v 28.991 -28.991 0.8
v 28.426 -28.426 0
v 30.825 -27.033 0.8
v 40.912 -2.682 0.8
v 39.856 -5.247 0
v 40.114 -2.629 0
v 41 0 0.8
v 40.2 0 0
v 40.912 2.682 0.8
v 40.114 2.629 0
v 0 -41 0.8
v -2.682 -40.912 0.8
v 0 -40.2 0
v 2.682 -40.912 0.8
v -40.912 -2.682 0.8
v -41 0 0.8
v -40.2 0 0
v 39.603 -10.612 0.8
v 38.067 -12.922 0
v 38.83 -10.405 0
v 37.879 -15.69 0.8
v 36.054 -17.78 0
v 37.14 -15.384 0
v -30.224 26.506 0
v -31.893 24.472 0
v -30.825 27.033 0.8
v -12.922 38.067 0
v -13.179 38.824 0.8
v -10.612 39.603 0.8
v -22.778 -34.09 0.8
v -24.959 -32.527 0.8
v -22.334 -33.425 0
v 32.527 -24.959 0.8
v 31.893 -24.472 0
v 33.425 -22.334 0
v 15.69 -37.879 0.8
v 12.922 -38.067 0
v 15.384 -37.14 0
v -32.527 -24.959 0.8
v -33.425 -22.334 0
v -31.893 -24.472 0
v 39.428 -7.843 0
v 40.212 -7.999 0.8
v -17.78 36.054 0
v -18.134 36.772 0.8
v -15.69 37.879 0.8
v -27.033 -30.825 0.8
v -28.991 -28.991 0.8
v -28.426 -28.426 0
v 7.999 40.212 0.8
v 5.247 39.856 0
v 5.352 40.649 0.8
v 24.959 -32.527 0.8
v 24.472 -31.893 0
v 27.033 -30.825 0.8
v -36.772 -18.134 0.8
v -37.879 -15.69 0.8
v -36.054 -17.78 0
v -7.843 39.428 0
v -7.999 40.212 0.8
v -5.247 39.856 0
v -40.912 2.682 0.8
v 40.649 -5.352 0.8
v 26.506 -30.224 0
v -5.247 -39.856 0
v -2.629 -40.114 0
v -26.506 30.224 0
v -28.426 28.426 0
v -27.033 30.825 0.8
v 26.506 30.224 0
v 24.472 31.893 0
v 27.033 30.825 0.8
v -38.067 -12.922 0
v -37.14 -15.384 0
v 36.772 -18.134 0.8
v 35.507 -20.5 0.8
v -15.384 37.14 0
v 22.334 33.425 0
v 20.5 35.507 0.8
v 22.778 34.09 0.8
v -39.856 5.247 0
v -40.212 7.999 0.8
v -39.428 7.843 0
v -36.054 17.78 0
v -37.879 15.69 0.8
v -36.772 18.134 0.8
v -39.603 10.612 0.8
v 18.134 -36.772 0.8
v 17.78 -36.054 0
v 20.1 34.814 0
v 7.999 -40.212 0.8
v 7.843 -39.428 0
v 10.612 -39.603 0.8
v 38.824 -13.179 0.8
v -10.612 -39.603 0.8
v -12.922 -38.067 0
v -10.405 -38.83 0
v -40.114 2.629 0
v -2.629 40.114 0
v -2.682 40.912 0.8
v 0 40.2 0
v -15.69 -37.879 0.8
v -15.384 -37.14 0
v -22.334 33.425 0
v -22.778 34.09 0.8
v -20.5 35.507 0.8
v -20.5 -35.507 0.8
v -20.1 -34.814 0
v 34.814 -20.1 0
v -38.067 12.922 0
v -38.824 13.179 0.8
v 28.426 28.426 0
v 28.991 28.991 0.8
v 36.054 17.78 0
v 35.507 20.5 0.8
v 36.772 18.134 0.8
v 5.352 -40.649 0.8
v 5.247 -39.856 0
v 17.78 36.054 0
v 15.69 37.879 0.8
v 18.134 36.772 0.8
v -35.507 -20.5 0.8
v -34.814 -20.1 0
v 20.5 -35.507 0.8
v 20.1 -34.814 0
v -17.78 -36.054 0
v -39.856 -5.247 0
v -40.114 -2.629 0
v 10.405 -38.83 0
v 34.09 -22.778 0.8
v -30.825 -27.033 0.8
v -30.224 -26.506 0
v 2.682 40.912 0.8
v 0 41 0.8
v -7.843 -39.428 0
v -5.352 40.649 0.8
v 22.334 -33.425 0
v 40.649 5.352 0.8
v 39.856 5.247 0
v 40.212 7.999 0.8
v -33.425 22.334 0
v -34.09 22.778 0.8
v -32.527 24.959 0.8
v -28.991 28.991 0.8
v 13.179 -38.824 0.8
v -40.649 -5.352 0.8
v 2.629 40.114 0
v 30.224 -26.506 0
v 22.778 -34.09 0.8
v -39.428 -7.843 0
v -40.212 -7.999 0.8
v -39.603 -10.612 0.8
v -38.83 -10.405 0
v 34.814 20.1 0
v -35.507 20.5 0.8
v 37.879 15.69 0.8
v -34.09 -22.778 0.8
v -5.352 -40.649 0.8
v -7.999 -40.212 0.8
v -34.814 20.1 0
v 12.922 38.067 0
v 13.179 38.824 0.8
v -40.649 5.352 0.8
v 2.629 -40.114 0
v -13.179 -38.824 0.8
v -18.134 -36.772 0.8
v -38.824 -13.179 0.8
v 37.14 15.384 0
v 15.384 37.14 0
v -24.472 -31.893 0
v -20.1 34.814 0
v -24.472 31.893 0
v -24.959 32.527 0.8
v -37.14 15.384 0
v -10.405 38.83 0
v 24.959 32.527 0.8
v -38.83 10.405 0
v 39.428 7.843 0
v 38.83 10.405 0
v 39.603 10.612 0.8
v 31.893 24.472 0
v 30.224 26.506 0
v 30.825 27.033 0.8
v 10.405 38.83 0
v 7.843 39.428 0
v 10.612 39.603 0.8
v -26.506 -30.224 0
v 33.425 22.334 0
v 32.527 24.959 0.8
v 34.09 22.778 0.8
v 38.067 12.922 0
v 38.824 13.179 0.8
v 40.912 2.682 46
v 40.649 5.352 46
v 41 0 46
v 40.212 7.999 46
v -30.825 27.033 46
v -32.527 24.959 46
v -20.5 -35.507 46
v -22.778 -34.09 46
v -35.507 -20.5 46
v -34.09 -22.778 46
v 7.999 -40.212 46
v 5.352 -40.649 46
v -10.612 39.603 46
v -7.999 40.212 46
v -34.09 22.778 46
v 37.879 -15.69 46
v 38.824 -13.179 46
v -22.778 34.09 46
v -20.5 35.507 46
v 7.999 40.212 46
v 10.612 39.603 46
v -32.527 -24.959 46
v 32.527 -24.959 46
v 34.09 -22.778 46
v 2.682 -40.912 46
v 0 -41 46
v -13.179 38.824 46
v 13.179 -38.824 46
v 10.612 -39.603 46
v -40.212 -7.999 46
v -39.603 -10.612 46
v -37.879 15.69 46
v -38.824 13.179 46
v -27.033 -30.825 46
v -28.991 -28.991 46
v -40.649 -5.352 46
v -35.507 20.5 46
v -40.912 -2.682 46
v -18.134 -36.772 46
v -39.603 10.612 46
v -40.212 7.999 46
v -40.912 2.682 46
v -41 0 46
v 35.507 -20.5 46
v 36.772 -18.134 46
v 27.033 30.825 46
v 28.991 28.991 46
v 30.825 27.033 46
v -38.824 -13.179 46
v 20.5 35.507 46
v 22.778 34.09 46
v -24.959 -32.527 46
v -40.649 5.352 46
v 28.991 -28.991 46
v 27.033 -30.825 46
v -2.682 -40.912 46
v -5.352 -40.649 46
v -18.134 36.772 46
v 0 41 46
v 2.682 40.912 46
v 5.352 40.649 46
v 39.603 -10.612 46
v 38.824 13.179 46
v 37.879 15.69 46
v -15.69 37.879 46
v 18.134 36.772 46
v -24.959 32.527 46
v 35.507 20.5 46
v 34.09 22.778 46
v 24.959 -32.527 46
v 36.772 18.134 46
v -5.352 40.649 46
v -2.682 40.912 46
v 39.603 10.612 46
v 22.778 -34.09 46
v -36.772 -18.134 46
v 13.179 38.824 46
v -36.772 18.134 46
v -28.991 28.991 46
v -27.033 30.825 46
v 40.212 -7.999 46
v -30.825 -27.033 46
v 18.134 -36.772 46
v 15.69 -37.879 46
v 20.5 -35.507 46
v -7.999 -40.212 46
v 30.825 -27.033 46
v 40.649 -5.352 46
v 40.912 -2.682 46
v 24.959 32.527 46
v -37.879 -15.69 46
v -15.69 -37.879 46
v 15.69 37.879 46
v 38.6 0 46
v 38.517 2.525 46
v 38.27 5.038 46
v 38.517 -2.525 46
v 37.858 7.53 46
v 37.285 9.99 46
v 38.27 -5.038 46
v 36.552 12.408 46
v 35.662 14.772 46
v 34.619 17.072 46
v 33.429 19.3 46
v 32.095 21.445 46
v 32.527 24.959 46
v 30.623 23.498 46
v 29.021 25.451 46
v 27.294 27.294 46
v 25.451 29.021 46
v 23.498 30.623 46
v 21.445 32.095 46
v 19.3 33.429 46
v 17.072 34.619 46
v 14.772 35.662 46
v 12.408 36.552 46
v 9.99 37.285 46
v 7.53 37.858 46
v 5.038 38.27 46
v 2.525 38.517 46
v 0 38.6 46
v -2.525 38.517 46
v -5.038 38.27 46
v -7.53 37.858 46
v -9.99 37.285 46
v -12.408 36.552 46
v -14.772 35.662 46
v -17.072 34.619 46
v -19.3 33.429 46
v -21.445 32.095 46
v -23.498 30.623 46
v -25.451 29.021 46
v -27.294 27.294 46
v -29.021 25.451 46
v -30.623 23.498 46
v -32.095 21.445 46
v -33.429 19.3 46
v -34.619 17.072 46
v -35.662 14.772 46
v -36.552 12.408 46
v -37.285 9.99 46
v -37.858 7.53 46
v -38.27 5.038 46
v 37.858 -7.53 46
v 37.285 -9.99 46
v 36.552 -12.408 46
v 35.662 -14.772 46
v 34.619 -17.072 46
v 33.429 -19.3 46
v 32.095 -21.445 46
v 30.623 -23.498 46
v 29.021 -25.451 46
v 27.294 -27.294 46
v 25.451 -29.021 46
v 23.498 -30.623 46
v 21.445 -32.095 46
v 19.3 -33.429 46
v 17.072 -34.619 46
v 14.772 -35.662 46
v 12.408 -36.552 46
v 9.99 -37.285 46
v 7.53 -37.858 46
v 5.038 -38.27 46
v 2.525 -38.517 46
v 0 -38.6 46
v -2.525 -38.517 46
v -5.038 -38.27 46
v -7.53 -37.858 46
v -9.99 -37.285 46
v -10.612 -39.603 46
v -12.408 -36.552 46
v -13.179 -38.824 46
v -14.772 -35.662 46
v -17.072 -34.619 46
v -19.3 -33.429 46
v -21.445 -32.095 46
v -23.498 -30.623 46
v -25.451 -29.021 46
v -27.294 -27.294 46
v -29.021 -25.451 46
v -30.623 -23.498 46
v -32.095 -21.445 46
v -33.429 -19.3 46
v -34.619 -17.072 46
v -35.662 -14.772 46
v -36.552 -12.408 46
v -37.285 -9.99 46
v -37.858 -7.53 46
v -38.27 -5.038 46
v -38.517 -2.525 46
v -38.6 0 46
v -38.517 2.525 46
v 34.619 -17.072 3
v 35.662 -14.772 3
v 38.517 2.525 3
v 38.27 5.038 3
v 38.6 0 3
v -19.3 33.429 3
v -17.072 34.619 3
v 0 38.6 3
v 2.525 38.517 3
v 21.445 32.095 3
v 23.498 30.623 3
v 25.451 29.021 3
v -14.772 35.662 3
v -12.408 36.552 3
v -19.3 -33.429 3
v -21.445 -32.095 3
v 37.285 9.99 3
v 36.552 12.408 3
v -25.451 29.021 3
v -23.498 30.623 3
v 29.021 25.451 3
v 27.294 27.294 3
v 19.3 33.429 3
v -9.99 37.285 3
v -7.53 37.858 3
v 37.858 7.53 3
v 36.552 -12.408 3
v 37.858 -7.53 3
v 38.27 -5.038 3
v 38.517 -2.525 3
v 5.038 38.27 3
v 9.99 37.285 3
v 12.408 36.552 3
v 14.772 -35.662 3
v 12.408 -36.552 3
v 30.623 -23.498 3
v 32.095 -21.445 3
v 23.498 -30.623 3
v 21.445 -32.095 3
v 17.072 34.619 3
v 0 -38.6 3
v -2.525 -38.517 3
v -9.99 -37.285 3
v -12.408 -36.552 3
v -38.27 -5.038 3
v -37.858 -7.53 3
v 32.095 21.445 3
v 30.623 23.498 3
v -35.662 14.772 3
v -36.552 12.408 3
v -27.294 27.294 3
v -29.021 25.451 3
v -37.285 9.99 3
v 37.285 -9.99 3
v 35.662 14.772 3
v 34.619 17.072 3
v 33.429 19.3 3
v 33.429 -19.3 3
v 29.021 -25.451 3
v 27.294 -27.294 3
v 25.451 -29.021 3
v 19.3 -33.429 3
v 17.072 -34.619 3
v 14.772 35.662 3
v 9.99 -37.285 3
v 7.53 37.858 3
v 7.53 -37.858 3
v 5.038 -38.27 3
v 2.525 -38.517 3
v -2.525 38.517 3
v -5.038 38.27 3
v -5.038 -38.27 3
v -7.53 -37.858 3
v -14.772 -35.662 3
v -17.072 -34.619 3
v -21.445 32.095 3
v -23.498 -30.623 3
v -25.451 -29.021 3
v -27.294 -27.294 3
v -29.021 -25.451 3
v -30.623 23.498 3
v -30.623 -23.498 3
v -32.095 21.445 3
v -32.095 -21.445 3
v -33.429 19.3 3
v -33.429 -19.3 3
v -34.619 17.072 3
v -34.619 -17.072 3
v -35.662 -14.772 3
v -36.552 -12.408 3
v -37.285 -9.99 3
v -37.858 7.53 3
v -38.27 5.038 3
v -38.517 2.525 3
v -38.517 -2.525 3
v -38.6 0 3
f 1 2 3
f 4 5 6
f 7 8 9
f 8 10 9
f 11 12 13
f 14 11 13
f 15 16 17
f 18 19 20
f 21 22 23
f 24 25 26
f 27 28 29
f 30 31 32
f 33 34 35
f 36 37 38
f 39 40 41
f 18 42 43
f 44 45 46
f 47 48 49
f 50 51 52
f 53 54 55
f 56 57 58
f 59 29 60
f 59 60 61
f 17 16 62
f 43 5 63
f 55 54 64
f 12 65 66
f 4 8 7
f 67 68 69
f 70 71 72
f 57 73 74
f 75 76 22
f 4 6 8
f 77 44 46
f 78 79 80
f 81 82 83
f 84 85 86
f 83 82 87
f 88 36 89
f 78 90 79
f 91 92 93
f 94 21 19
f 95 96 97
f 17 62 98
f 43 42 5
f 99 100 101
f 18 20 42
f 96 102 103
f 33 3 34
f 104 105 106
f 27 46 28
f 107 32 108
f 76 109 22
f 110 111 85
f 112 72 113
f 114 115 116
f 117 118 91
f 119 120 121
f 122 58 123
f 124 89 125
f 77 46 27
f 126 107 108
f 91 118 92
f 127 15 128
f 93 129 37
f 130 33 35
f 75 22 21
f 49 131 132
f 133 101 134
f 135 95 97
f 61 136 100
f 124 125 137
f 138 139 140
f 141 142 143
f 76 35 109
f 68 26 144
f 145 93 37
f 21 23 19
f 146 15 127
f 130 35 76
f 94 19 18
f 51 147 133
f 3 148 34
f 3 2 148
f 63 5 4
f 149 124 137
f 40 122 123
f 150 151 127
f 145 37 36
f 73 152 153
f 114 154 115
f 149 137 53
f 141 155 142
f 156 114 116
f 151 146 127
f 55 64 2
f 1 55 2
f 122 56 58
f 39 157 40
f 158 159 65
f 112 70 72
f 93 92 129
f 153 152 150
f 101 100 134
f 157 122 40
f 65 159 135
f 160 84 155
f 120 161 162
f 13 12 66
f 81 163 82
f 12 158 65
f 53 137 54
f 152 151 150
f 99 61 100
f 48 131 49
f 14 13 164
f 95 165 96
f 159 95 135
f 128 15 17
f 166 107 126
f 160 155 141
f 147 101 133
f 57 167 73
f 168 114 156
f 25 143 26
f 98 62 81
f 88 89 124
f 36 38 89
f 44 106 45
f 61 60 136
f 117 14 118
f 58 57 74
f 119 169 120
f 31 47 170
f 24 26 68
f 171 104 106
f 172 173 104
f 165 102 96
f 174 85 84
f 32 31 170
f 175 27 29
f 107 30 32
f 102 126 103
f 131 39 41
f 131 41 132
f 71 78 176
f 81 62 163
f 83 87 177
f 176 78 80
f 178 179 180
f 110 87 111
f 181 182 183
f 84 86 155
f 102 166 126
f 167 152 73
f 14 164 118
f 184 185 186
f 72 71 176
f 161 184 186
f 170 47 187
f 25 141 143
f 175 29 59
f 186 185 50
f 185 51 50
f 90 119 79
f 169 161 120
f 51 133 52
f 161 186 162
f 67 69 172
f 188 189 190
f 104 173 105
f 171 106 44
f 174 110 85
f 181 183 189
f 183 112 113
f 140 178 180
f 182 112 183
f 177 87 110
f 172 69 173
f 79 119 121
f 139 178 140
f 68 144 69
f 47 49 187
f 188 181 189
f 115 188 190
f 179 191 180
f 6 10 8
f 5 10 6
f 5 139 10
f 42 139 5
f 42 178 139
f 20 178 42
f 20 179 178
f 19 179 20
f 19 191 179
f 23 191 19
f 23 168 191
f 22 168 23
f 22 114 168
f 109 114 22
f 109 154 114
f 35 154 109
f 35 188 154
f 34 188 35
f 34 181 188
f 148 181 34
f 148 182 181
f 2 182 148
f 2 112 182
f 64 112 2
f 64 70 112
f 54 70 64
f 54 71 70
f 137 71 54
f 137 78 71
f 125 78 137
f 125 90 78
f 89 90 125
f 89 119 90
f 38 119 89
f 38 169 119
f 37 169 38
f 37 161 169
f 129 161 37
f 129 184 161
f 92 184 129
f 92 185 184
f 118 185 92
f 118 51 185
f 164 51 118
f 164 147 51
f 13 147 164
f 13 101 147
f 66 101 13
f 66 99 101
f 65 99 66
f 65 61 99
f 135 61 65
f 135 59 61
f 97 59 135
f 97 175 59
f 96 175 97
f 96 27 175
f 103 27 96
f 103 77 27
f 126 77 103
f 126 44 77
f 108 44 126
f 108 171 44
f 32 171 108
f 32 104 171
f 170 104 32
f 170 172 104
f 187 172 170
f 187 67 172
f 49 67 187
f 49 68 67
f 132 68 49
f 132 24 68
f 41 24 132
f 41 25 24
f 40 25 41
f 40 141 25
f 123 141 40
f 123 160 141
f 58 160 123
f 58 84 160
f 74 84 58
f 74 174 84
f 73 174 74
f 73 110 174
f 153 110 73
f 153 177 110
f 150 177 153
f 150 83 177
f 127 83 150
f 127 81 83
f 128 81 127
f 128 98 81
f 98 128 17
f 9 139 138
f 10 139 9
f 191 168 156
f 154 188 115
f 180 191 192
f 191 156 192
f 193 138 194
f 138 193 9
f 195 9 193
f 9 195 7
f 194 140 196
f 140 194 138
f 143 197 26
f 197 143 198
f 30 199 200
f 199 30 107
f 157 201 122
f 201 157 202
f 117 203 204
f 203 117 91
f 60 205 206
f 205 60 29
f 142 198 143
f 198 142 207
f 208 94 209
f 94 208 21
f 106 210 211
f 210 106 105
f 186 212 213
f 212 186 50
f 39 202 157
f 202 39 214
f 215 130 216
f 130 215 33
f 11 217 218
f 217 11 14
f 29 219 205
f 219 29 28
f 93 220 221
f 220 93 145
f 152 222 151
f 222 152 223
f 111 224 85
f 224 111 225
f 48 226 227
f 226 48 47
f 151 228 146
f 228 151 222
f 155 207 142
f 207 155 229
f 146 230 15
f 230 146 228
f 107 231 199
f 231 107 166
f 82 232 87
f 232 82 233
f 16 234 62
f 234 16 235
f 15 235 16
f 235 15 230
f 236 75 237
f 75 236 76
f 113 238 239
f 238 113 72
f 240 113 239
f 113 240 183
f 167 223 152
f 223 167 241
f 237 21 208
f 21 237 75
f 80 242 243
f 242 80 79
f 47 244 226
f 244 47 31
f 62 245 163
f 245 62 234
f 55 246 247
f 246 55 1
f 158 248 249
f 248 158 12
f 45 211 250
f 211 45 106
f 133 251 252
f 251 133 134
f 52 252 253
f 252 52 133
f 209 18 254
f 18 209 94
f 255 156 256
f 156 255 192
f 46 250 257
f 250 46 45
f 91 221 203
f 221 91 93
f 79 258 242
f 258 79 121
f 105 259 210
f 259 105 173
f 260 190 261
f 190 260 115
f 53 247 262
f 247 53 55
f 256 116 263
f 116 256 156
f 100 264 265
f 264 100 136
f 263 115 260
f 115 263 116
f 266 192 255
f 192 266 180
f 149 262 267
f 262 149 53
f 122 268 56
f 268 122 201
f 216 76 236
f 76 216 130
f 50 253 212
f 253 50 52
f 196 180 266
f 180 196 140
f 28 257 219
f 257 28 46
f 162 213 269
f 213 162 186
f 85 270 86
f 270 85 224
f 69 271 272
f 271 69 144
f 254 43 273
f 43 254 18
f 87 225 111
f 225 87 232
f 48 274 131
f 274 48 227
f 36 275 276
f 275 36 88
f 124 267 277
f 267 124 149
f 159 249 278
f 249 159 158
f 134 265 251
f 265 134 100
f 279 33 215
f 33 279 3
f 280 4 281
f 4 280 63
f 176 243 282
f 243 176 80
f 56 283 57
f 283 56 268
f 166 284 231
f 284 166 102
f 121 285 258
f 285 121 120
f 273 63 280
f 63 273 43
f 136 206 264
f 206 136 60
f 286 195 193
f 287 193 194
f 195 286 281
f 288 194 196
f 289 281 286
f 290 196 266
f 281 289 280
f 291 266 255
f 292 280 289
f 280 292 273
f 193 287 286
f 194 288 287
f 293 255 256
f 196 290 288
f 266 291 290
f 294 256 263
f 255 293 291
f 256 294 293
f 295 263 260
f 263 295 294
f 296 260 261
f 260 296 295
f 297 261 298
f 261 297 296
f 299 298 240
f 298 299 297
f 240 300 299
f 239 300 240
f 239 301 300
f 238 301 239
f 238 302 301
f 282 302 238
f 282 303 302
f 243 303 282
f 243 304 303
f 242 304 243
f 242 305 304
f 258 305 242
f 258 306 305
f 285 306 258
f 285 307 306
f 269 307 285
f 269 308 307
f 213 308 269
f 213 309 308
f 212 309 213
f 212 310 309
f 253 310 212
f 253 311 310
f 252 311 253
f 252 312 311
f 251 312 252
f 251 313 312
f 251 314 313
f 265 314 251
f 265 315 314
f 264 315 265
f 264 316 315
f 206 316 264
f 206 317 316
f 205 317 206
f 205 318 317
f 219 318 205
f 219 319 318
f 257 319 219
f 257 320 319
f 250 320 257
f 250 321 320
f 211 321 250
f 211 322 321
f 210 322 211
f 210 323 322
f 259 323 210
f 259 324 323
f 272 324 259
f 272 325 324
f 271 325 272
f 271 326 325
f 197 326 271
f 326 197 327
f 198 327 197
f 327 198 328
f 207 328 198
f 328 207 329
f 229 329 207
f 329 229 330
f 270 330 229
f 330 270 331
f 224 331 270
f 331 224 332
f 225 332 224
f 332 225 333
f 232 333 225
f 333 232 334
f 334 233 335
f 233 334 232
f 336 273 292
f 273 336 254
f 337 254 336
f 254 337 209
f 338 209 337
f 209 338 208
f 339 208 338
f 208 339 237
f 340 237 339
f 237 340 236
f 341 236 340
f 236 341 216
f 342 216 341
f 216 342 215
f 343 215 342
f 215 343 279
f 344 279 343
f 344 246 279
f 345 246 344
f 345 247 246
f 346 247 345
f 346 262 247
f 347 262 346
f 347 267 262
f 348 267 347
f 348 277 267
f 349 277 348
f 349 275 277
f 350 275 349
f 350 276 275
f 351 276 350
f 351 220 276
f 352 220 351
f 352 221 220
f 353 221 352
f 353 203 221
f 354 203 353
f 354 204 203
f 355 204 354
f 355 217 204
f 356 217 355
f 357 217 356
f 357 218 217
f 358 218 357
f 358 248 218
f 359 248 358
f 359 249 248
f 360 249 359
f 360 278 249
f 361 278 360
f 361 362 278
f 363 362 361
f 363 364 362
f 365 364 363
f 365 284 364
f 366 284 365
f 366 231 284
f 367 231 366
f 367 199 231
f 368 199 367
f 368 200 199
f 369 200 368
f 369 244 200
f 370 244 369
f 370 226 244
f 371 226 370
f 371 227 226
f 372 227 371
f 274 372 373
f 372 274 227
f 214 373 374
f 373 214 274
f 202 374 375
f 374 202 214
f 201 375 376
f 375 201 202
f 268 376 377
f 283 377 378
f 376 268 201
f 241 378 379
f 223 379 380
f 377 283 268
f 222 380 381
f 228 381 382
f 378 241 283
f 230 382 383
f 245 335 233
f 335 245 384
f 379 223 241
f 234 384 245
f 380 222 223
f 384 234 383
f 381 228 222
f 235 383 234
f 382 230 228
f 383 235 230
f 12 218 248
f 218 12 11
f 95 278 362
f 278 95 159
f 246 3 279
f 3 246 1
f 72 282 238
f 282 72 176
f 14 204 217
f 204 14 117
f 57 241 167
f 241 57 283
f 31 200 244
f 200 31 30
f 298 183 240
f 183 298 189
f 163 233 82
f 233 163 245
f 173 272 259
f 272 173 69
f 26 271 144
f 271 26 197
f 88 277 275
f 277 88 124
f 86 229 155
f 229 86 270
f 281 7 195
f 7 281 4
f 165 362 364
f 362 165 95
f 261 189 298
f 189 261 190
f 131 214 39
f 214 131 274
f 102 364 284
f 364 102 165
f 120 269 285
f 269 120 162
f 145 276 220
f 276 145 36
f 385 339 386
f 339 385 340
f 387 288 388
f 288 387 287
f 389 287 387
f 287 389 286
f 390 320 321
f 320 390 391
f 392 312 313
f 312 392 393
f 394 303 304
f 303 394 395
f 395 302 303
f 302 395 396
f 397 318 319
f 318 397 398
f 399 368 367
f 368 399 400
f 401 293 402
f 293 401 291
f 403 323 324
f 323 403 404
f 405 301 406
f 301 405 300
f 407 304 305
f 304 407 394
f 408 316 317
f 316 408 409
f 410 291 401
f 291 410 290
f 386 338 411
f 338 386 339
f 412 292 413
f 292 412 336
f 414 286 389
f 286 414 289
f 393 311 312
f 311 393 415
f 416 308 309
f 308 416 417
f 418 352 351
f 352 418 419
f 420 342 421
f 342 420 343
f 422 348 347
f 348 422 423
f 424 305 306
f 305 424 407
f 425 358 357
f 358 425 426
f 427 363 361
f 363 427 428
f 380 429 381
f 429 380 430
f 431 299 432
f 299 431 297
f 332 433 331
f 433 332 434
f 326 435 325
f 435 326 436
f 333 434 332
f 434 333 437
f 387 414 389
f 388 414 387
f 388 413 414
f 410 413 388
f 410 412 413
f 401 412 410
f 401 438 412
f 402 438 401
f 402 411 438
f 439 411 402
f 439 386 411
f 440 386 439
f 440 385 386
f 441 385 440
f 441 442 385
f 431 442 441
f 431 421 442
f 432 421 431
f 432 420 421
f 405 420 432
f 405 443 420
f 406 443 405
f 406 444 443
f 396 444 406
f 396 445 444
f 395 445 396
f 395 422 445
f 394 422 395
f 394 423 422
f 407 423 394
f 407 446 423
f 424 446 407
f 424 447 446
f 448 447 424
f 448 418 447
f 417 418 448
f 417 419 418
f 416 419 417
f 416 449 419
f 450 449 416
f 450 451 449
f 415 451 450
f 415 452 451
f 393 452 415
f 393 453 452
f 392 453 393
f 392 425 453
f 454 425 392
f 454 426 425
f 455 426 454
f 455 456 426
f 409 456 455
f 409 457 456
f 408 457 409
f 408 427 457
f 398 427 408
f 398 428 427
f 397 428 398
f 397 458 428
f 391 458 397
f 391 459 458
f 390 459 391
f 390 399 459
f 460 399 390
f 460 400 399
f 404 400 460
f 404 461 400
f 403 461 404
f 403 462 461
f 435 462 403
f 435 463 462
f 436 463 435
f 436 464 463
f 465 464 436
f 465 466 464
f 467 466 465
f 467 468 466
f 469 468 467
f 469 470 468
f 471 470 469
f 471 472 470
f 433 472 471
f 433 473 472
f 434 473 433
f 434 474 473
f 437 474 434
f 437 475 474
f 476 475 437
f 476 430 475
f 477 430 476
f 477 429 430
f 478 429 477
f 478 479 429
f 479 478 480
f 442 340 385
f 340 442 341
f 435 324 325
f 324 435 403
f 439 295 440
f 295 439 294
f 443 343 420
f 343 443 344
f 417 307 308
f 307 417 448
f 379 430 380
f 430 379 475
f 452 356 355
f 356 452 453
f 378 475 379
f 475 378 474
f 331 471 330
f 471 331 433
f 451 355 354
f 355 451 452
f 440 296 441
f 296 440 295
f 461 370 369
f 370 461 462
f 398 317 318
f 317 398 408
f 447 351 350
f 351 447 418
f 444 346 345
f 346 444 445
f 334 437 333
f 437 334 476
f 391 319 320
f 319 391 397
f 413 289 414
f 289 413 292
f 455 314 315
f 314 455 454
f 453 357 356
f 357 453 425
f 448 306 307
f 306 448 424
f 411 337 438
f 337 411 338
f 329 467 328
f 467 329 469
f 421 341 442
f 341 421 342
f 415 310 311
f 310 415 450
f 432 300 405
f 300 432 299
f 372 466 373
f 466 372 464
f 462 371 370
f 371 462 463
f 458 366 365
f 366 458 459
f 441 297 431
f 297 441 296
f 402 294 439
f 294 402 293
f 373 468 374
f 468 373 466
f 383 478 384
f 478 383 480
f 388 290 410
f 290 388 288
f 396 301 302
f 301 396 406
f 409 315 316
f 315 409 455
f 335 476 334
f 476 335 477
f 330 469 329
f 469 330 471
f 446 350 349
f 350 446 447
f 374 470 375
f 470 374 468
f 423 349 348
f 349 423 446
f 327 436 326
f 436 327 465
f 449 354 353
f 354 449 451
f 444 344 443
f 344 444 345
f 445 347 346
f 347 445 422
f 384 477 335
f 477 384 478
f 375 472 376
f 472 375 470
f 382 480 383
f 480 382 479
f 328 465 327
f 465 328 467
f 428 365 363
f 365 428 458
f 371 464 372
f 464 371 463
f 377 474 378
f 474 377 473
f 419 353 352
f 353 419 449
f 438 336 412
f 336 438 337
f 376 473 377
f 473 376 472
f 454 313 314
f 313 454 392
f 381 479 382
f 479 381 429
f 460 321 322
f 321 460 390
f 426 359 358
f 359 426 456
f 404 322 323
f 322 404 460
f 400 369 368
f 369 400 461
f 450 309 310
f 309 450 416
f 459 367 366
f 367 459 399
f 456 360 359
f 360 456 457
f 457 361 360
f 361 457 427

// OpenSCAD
// =====================================================================
//  CENICERO DE DOBLE CAMARA — separa "donde se fuma" de "donde se guarda"
// ----------------------------------------------------------------------
//  Piezas a imprimir:
//    cuerpo -> camara inferior, sellada por todos lados salvo el tubo
//              bajante de la tapa: ahi se acumulan ceniza y colillas ya
//              frias, casi sin contacto con el aire de la habitacion.
//    tapa   -> pieza de uso diario, a doble altura: el borde exterior
//              (3 muescas para apoyar el cigarro encendido) y, mas
//              adentro y mas bajo, un plato donde cae la ceniza suelta
//              mientras se fuma. En el centro, un agujero + tubo
//              bajante que se hunde en la camara del cuerpo: al acabar,
//              se empuja colilla y ceniza por ahi y quedan guardadas
//              abajo, ya fuera de la zona donde se huele.
//    tapon  -> sella el agujero entre caladas (opcional, imprime 1).
//
//  Por que el tubo es largo: el aire caliente y oloroso de la camara
//  sube y queda atrapado bajo la tapa, mientras que su unica salida (la
//  boca del tubo) esta 20 mm mas abajo. Es un sifon al reves, sin agua.
//
//  La tapa esta modelada en posicion de impresion: el tubo bajante
//  queda abajo (pared vertical delgada, sin voladizos) y el disco con
//  el plato y las muescas queda arriba, tal cual se usa.
//
//  Activa con 1 lo que quieras dibujar/exportar (0 = no). Milimetros.
// =====================================================================

// --- Que dibujar (1 = si, 0 = no) ---
cuerpo = 1;
tapa   = 0;
tapon  = 0;

$fn = 96;

// --- 1. CUERPO: camara sellada de almacenamiento --------------------
body_od   = 82;
body_wall = 2.4;
body_h    = 46;   // altura total, incluido el suelo
floor_h   = 3;
body_cham = 0.8;  // chaflan anti "pata de elefante"

// --- 2. Encaje tapa/cuerpo: la tapa hace de capuchon por fuera -------
fit_clr    = 0.3; // holgura diametral del faldon sobre el cuerpo
skirt_wall = 2.0;
skirt_h    = 10;  // cuanto abraza el faldon la pared exterior del cuerpo

// --- 3. TAPA: doble altura -------------------------------------------
rim_h      = 12;   // grosor del disco (zona del borde exterior)
dish_depth = 3;    // hondo del plato interior (zona de ceniza suelta)
dish_d     = 58;   // diametro del plato interior

// Muescas para el cigarro (borde exterior, a 120 grados)
notch_n     = 3;
notch_r     = 4;    // radio del canal (controla ancho y curvatura)
notch_depth = 3.5;  // hondo del canal, medido desde la cara superior

// Agujero central + tubo bajante (la garganta hacia la camara sellada).
// El tubo tiene el mismo diametro que el agujero: es el unico camino
// entre el plato y la camara de abajo.
hole_d    = 19;   // deja pasar una colilla incluso de lado
tube_wall = 1.6;
tube_len  = 20;   // cuanto se hunde el tubo en el cuerpo

// --- 4. TAPON del agujero (sella entre caladas) -----------------------
plug_clr = 0.6;   // holgura para que entre y salga sin forzar
plug_h   = 8;     // cuanto se mete por el agujero
head_lip = 3;     // cuanto sobresale la cabeza del hueco: apoya en el plato
head_h   = 2;
tab_l = 12;  tab_w = 5;  tab_h = 10;

// --- Geometria derivada -------------------------------------------------
body_id  = body_od - 2*body_wall;
skirt_id = body_od + fit_clr;
skirt_od = skirt_id + 2*skirt_wall;

// =====================================================================
//  CUERPO: cubo cerrado, solo se abre por arriba (donde entra el tubo).
// =====================================================================
module cenicero_cuerpo() {
    difference() {
        union() {
            cylinder(h = body_cham, d1 = body_od - 2*body_cham, d2 = body_od);
            translate([0, 0, body_cham])
                cylinder(h = body_h - body_cham, d = body_od);
        }
        translate([0, 0, floor_h])
            cylinder(h = body_h - floor_h + 1, d = body_id);
    }
}

// =====================================================================
//  TAPA
// =====================================================================
// Canal redondeado donde se apoya el cigarro: cilindro horizontal que
// solo asoma su parte de arriba sobre la cara del disco (0 = suelo del
// disco, rim_h = cara donde se apoya el cigarro).
module muesca() {
    center_z = rim_h - notch_depth + notch_r;
    L = skirt_od/2 + 6;
    translate([-2, 0, center_z])
        rotate([0, 90, 0])
            cylinder(h = L, d = 2*notch_r);
}

module cenicero_tapa() {
    z_disc = tube_len; // altura donde empieza el disco (apoya en el cuerpo)
    difference() {
        union() {
            // tubo bajante: se hunde en la camara sellada del cuerpo
            cylinder(h = tube_len, d = hole_d + 2*tube_wall);
            // faldon que abraza por fuera el borde superior del cuerpo
            translate([0, 0, z_disc - skirt_h])
                difference() {
                    cylinder(h = skirt_h, d = skirt_od);
                    translate([0, 0, -1]) cylinder(h = skirt_h + 2, d = skirt_id);
                }
            // disco: borde exterior (muescas) + plato interior mas bajo
            translate([0, 0, z_disc])
                cylinder(h = rim_h, d = skirt_od);
        }
        // garganta: agujero del disco + hueco del tubo, de una vez
        translate([0, 0, -1])
            cylinder(h = tube_len + rim_h + 2, d = hole_d);
        // plato interior donde cae la ceniza suelta mientras se fuma
        translate([0, 0, z_disc + rim_h - dish_depth])
            cylinder(h = dish_depth + 1, d = dish_d);
        // muescas para el cigarro, a 120 grados
        for (i = [0 : notch_n - 1])
            translate([0, 0, z_disc]) rotate([0, 0, i*360/notch_n]) muesca();
    }
}

// =====================================================================
//  TAPON: sella el agujero entre caladas para cortar del todo el paso
//  de aire hacia la camara de abajo. Cuerpo que entra por el agujero,
//  cabeza que apoya en el plato (para que no se cuele) y una aleta
//  para sacarlo. Se imprime tal cual: la cabeza crece a 45 grados.
// =====================================================================
module cenicero_tapon() {
    pd = hole_d - 2*plug_clr;
    hd = hole_d + 2*head_lip;
    cylinder(h = plug_h, d = pd);
    translate([0, 0, plug_h])
        cylinder(h = head_lip, d1 = pd, d2 = hd);
    translate([0, 0, plug_h + head_lip])
        cylinder(h = head_h, d = hd);
    translate([-tab_l/2, -tab_w/2, plug_h + head_lip + head_h - 0.01])
        cube([tab_l, tab_w, tab_h]);
}

// =====================================================================
//  RENDER: cada pieza activa en su carril para no solaparse.
// =====================================================================
if (cuerpo) cenicero_cuerpo();
if (tapa)   translate([body_od/2 + skirt_od/2 + 20, 0, 0]) cenicero_tapa();
if (tapon)  translate([body_od/2 + skirt_od/2 + 20, skirt_od + 20, 0]) cenicero_tapon();
